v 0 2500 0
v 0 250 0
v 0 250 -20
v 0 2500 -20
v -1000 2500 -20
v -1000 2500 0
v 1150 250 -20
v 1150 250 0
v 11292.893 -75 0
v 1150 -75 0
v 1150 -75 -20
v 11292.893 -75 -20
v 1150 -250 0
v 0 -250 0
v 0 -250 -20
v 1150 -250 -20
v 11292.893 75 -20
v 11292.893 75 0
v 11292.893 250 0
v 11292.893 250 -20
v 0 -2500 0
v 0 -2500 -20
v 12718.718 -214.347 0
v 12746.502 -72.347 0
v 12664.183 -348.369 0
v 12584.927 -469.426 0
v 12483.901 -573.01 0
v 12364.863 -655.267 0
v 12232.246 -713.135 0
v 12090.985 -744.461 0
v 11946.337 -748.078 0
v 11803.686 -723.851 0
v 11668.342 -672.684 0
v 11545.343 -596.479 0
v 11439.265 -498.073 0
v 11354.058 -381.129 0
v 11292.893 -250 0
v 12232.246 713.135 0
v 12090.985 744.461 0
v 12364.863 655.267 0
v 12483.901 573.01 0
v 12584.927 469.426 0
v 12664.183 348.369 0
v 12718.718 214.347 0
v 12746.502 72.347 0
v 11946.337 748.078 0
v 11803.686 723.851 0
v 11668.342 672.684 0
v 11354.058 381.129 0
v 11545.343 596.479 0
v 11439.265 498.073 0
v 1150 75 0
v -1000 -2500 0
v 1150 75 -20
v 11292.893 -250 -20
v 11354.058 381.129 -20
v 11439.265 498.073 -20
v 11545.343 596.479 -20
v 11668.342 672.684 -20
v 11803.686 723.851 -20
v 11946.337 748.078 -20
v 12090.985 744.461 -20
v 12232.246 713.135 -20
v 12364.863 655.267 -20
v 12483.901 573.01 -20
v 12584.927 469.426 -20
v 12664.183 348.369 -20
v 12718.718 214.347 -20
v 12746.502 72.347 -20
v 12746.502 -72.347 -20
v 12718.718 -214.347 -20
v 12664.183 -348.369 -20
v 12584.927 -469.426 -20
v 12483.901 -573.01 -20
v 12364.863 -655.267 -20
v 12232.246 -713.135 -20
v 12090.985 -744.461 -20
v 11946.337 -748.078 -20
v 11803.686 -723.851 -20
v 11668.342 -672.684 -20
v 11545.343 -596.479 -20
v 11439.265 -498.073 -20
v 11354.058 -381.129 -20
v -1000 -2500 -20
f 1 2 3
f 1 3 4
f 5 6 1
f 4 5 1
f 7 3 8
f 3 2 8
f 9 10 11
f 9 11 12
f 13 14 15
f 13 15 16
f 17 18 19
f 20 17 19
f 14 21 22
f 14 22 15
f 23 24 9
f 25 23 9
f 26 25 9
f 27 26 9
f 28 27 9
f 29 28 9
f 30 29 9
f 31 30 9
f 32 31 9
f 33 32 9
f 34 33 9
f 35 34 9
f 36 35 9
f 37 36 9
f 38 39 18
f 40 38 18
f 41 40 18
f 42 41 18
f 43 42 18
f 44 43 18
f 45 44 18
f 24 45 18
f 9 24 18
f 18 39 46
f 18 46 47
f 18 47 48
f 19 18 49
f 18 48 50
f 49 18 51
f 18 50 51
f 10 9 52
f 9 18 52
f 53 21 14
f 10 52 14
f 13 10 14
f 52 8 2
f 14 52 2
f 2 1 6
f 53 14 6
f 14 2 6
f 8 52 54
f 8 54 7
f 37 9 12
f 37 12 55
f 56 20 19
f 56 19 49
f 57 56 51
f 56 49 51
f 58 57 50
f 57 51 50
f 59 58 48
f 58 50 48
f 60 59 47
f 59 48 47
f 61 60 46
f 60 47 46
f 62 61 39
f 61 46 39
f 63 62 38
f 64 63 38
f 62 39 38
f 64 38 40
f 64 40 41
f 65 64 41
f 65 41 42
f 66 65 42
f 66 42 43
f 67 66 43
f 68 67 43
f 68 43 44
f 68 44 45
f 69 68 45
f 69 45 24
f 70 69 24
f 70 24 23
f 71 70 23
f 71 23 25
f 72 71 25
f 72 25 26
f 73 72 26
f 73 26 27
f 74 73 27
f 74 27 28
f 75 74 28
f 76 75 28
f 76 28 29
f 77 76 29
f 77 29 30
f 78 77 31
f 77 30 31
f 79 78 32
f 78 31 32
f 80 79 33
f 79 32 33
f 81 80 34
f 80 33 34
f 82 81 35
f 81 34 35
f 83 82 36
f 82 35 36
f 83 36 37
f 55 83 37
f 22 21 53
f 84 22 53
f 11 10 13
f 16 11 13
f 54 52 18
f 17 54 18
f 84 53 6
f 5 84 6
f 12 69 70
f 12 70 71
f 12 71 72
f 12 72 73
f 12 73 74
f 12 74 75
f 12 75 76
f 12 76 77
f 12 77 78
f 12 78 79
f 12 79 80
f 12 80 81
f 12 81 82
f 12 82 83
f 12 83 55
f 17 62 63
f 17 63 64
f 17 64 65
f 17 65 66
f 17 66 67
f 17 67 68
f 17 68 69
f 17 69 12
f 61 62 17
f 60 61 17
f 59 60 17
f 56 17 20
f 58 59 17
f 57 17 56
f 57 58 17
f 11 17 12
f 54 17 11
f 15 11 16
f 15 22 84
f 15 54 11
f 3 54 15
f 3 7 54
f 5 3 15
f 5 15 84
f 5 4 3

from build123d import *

# Parameters (mm, degrees)
BOSS_EXTRUDE1_DEPTH = 20
SKETCH2_W           = 1000
SKETCH2_H           = 2250
CUT_EXTRUDE1_DEPTH  = 12993.801853334
CUT_EXTRUDE4_DEPTH  = 12993.801853334
SKETCH5_W           = 11500
SKETCH5_H           = 500
BOSS_EXTRUDE2_DEPTH = 20
SKETCH7_W           = 10142.893218813
SKETCH7_H           = 100
CUT_EXTRUDE5_DEPTH  = 12993.801853334
SKETCH8_W           = 10142.893218813
SKETCH8_H           = 75
CUT_EXTRUDE6_DEPTH  = 12993.801853334


with BuildPart() as part:
    # Sketch1 → Boss-Extrude1 (new body)
    with BuildSketch(Plane.XY):
        with BuildLine():
            Line((1000, 250), (5000, 250))
            Line((5000, 250), (5000, 125))
            Line((5000, 125), (9000, 125))
            Line((9000, 125), (9000, 100))
            Line((9000, 100), (11256.696562634, 100))
            ThreePointArc((11256.696562634, 100), (12750, 0), (11256.696562634, -100))
            Line((11256.696562634, -100), (9000, -100))
            Line((9000, -100), (9000, -125))
            Line((9000, -125), (5000, -125))
            Line((5000, -125), (5000, -250))
            Line((5000, -250), (1000, -250))
            Line((1000, -250), (1000, -2500))
            Line((1000, -2500), (-1000, -2500))
            Line((-1000, -2500), (-1000, 2500))
            Line((-1000, 2500), (1000, 2500))
            Line((1000, 2500), (1000, 250))
        make_face()
    extrude(amount=-BOSS_EXTRUDE1_DEPTH)

    # Sketch2 → Cut-Extrude1 (cut, through all)
    with BuildSketch(Plane.XY):
        with Locations((500, 1375)):
            Rectangle(SKETCH2_W, SKETCH2_H)
        with Locations((500, -1375)):
            Rectangle(SKETCH2_W, SKETCH2_H)
    extrude(amount=-CUT_EXTRUDE1_DEPTH, mode=Mode.SUBTRACT)

    # Sketch3 → Cut-Extrude4 (cut, through all)
    with BuildSketch(Plane.XY):
        Polygon((1500, -250), (3250, -250), (5000, -250), (5000, -150), (3250, -150), (3250, -200), (1500, -200), align=None)
    cut_extrude4 = extrude(amount=-CUT_EXTRUDE4_DEPTH, mode=Mode.SUBTRACT)

    # Mirror1: Cut-Extrude4 across plane
    add(cut_extrude4.mirror(Plane.ZX), mode=Mode.SUBTRACT)

    # Sketch5 → Boss-Extrude2 (add)
    with BuildSketch(Plane.XY):
        with Locations((5750, 0)):
            Rectangle(SKETCH5_W, SKETCH5_H)
    extrude(amount=-BOSS_EXTRUDE2_DEPTH)

    # Sketch7 → Cut-Extrude5 (cut, through all)
    with BuildSketch(Plane.XY):
        with Locations((6221.446609407, 200)):
            Rectangle(SKETCH7_W, SKETCH7_H)
    cut_extrude5 = extrude(amount=-CUT_EXTRUDE5_DEPTH, mode=Mode.SUBTRACT)

    # Mirror2: Cut-Extrude5 across plane
    add(cut_extrude5.mirror(Plane.ZX), mode=Mode.SUBTRACT)

    # Sketch8 → Cut-Extrude6 (cut, through all)
    with BuildSketch(Plane.XY):
        with Locations((6221.446609407, 112.5)):
            Rectangle(SKETCH8_W, SKETCH8_H)
    cut_extrude6 = extrude(amount=-CUT_EXTRUDE6_DEPTH, mode=Mode.SUBTRACT)

    # Mirror3: Cut-Extrude6 across plane
    add(cut_extrude6.mirror(Plane.ZX), mode=Mode.SUBTRACT)


solid = part.part
